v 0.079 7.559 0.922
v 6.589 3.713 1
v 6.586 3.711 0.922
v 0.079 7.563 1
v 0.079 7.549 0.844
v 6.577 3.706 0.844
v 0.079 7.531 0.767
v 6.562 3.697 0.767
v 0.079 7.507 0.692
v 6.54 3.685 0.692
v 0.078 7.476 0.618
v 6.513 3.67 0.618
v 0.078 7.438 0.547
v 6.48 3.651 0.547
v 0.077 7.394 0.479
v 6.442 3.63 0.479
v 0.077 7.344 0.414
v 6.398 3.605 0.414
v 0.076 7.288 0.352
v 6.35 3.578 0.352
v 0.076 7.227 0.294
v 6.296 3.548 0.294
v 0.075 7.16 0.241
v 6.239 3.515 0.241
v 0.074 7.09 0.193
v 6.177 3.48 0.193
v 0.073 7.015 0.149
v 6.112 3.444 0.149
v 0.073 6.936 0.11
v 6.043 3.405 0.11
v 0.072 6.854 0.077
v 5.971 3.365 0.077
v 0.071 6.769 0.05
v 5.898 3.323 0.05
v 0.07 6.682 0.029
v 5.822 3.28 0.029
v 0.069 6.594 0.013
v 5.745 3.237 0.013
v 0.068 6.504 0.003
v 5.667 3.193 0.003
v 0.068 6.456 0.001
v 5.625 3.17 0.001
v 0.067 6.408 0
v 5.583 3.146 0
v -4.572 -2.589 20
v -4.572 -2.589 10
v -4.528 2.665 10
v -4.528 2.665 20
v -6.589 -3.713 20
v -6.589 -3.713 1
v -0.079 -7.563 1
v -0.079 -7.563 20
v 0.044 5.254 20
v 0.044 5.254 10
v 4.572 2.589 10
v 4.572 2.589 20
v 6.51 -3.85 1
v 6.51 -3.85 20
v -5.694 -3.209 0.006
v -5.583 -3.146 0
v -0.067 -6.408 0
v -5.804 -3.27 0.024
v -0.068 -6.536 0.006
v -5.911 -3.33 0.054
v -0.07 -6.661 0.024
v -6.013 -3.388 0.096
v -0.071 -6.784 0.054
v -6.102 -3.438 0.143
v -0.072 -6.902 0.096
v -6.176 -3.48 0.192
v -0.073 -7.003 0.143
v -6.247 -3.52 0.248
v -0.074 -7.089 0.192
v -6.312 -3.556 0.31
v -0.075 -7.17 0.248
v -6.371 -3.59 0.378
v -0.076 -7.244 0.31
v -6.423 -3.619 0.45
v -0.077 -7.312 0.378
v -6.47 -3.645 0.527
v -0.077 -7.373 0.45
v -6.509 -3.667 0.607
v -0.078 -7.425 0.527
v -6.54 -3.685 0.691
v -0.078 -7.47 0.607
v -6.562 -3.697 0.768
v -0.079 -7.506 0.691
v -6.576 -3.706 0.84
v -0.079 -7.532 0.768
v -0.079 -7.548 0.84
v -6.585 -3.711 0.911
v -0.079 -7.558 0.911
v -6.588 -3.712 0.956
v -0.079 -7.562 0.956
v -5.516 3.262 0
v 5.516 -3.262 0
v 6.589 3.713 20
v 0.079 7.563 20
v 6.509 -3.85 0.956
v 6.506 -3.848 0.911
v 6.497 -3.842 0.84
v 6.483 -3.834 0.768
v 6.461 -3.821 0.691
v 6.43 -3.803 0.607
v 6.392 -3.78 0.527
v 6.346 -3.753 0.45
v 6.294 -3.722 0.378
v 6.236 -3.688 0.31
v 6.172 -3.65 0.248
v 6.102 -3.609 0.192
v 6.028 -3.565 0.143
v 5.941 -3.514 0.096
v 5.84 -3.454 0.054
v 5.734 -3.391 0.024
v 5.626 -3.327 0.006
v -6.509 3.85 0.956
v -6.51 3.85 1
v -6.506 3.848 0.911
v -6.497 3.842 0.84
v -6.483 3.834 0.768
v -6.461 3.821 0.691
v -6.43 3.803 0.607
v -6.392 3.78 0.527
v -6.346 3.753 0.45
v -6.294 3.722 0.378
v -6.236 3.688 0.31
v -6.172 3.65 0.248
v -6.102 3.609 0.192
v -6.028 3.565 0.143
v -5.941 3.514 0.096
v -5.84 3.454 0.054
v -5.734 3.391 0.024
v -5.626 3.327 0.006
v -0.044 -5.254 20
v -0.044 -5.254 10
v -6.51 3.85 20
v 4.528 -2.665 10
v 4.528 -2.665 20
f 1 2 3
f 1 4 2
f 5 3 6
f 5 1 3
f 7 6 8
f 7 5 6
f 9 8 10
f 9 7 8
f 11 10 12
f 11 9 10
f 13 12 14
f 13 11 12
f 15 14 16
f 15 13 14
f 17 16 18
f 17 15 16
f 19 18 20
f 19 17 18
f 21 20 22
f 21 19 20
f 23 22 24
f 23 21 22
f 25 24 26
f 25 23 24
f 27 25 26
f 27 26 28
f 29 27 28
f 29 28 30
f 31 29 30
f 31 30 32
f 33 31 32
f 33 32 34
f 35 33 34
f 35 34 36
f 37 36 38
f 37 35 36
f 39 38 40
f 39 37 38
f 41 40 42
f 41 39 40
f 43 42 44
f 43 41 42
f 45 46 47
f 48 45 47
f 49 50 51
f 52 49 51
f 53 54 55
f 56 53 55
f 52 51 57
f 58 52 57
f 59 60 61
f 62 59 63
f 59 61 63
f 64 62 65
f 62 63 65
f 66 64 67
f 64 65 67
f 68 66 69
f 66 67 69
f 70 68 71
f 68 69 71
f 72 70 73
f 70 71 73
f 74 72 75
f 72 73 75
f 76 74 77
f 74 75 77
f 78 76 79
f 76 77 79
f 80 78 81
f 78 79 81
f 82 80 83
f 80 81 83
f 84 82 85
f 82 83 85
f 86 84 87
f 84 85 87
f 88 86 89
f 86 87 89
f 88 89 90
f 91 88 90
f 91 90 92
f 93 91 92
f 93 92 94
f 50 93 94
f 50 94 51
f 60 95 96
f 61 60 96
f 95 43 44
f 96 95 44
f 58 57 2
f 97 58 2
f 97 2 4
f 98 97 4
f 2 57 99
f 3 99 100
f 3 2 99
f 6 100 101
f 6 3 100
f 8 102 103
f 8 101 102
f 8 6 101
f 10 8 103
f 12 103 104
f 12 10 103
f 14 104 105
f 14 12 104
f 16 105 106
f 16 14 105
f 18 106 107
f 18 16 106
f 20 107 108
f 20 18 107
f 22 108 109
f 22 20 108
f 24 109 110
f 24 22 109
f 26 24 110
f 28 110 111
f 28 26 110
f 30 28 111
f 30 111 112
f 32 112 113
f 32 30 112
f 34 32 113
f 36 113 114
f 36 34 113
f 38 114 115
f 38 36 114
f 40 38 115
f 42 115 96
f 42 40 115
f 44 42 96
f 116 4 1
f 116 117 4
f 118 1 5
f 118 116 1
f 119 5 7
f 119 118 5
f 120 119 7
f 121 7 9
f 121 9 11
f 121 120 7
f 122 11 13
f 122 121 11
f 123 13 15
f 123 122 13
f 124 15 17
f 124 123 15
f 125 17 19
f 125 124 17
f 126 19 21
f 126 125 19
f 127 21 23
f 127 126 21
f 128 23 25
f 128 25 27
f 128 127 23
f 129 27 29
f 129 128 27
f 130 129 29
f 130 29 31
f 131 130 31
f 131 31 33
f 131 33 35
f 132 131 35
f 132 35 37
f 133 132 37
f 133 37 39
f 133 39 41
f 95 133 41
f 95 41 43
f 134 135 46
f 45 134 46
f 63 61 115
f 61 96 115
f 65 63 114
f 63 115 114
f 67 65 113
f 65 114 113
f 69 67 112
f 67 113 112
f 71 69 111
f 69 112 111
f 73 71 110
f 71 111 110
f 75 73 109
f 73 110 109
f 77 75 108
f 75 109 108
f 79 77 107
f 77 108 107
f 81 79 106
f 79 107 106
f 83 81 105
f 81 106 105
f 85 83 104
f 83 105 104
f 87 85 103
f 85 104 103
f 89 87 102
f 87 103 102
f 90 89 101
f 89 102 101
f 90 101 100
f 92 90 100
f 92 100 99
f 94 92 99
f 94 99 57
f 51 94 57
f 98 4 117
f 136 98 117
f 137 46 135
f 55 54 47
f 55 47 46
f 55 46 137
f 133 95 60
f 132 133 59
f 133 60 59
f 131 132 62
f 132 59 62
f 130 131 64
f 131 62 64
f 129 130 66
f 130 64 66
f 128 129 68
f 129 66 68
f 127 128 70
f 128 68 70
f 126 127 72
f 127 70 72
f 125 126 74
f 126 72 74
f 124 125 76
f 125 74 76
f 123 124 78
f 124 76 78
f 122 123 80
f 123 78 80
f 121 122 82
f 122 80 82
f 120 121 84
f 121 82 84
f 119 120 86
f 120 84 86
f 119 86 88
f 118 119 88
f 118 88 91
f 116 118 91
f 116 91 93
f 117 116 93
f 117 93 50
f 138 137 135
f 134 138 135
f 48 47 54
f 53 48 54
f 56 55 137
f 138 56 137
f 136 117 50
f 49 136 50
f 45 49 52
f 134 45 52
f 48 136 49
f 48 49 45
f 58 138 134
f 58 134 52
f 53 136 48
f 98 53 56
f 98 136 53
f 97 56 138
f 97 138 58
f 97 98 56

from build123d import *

# Parameters (mm, degrees)
F1_DEPTH = 10
F2_DEPTH = 20
F3_R     = 1


with BuildPart() as f1:
    # F0 (on Top) → F1 (new body)
    with BuildSketch(Plane.XY):
        Polygon((4.571693, 2.589007), (0.0437, 5.253706), (-4.527993, 2.664698), (-4.571693, -2.589007), (-0.0437, -5.253706), (4.527993, -2.664698), align=None)
    extrude(amount=F1_DEPTH)

    # F0 (on Top) → F2 (join)
    with BuildSketch(Plane.XY):
        Polygon((6.589365, 3.712885), (0.07923, 7.563), (-6.510135, 3.850115), (-6.589365, -3.712885), (-0.07923, -7.563), (6.510135, -3.850115), align=None)
        Polygon((-4.527993, 2.664698), (0.0437, 5.253706), (4.571693, 2.589007), (4.527993, -2.664698), (-0.0437, -5.253706), (-4.571693, -2.589007), align=None, mode=Mode.SUBTRACT)
    extrude(amount=F2_DEPTH)

    # F3
    f3_edges = [f1.edges().sort_by_distance(p)[0] for p in [
        (3.215452, -5.706557, 0),
        (-3.334297, -5.637942, 0),
        (-6.54975, 0.068615, 0),
        (-3.215452, 5.706557, 0),
        (3.334297, 5.637942, 0),
        (6.54975, -0.068615, 0),
    ]]
    fillet(f3_edges, radius=F3_R)


solid = f1.part
